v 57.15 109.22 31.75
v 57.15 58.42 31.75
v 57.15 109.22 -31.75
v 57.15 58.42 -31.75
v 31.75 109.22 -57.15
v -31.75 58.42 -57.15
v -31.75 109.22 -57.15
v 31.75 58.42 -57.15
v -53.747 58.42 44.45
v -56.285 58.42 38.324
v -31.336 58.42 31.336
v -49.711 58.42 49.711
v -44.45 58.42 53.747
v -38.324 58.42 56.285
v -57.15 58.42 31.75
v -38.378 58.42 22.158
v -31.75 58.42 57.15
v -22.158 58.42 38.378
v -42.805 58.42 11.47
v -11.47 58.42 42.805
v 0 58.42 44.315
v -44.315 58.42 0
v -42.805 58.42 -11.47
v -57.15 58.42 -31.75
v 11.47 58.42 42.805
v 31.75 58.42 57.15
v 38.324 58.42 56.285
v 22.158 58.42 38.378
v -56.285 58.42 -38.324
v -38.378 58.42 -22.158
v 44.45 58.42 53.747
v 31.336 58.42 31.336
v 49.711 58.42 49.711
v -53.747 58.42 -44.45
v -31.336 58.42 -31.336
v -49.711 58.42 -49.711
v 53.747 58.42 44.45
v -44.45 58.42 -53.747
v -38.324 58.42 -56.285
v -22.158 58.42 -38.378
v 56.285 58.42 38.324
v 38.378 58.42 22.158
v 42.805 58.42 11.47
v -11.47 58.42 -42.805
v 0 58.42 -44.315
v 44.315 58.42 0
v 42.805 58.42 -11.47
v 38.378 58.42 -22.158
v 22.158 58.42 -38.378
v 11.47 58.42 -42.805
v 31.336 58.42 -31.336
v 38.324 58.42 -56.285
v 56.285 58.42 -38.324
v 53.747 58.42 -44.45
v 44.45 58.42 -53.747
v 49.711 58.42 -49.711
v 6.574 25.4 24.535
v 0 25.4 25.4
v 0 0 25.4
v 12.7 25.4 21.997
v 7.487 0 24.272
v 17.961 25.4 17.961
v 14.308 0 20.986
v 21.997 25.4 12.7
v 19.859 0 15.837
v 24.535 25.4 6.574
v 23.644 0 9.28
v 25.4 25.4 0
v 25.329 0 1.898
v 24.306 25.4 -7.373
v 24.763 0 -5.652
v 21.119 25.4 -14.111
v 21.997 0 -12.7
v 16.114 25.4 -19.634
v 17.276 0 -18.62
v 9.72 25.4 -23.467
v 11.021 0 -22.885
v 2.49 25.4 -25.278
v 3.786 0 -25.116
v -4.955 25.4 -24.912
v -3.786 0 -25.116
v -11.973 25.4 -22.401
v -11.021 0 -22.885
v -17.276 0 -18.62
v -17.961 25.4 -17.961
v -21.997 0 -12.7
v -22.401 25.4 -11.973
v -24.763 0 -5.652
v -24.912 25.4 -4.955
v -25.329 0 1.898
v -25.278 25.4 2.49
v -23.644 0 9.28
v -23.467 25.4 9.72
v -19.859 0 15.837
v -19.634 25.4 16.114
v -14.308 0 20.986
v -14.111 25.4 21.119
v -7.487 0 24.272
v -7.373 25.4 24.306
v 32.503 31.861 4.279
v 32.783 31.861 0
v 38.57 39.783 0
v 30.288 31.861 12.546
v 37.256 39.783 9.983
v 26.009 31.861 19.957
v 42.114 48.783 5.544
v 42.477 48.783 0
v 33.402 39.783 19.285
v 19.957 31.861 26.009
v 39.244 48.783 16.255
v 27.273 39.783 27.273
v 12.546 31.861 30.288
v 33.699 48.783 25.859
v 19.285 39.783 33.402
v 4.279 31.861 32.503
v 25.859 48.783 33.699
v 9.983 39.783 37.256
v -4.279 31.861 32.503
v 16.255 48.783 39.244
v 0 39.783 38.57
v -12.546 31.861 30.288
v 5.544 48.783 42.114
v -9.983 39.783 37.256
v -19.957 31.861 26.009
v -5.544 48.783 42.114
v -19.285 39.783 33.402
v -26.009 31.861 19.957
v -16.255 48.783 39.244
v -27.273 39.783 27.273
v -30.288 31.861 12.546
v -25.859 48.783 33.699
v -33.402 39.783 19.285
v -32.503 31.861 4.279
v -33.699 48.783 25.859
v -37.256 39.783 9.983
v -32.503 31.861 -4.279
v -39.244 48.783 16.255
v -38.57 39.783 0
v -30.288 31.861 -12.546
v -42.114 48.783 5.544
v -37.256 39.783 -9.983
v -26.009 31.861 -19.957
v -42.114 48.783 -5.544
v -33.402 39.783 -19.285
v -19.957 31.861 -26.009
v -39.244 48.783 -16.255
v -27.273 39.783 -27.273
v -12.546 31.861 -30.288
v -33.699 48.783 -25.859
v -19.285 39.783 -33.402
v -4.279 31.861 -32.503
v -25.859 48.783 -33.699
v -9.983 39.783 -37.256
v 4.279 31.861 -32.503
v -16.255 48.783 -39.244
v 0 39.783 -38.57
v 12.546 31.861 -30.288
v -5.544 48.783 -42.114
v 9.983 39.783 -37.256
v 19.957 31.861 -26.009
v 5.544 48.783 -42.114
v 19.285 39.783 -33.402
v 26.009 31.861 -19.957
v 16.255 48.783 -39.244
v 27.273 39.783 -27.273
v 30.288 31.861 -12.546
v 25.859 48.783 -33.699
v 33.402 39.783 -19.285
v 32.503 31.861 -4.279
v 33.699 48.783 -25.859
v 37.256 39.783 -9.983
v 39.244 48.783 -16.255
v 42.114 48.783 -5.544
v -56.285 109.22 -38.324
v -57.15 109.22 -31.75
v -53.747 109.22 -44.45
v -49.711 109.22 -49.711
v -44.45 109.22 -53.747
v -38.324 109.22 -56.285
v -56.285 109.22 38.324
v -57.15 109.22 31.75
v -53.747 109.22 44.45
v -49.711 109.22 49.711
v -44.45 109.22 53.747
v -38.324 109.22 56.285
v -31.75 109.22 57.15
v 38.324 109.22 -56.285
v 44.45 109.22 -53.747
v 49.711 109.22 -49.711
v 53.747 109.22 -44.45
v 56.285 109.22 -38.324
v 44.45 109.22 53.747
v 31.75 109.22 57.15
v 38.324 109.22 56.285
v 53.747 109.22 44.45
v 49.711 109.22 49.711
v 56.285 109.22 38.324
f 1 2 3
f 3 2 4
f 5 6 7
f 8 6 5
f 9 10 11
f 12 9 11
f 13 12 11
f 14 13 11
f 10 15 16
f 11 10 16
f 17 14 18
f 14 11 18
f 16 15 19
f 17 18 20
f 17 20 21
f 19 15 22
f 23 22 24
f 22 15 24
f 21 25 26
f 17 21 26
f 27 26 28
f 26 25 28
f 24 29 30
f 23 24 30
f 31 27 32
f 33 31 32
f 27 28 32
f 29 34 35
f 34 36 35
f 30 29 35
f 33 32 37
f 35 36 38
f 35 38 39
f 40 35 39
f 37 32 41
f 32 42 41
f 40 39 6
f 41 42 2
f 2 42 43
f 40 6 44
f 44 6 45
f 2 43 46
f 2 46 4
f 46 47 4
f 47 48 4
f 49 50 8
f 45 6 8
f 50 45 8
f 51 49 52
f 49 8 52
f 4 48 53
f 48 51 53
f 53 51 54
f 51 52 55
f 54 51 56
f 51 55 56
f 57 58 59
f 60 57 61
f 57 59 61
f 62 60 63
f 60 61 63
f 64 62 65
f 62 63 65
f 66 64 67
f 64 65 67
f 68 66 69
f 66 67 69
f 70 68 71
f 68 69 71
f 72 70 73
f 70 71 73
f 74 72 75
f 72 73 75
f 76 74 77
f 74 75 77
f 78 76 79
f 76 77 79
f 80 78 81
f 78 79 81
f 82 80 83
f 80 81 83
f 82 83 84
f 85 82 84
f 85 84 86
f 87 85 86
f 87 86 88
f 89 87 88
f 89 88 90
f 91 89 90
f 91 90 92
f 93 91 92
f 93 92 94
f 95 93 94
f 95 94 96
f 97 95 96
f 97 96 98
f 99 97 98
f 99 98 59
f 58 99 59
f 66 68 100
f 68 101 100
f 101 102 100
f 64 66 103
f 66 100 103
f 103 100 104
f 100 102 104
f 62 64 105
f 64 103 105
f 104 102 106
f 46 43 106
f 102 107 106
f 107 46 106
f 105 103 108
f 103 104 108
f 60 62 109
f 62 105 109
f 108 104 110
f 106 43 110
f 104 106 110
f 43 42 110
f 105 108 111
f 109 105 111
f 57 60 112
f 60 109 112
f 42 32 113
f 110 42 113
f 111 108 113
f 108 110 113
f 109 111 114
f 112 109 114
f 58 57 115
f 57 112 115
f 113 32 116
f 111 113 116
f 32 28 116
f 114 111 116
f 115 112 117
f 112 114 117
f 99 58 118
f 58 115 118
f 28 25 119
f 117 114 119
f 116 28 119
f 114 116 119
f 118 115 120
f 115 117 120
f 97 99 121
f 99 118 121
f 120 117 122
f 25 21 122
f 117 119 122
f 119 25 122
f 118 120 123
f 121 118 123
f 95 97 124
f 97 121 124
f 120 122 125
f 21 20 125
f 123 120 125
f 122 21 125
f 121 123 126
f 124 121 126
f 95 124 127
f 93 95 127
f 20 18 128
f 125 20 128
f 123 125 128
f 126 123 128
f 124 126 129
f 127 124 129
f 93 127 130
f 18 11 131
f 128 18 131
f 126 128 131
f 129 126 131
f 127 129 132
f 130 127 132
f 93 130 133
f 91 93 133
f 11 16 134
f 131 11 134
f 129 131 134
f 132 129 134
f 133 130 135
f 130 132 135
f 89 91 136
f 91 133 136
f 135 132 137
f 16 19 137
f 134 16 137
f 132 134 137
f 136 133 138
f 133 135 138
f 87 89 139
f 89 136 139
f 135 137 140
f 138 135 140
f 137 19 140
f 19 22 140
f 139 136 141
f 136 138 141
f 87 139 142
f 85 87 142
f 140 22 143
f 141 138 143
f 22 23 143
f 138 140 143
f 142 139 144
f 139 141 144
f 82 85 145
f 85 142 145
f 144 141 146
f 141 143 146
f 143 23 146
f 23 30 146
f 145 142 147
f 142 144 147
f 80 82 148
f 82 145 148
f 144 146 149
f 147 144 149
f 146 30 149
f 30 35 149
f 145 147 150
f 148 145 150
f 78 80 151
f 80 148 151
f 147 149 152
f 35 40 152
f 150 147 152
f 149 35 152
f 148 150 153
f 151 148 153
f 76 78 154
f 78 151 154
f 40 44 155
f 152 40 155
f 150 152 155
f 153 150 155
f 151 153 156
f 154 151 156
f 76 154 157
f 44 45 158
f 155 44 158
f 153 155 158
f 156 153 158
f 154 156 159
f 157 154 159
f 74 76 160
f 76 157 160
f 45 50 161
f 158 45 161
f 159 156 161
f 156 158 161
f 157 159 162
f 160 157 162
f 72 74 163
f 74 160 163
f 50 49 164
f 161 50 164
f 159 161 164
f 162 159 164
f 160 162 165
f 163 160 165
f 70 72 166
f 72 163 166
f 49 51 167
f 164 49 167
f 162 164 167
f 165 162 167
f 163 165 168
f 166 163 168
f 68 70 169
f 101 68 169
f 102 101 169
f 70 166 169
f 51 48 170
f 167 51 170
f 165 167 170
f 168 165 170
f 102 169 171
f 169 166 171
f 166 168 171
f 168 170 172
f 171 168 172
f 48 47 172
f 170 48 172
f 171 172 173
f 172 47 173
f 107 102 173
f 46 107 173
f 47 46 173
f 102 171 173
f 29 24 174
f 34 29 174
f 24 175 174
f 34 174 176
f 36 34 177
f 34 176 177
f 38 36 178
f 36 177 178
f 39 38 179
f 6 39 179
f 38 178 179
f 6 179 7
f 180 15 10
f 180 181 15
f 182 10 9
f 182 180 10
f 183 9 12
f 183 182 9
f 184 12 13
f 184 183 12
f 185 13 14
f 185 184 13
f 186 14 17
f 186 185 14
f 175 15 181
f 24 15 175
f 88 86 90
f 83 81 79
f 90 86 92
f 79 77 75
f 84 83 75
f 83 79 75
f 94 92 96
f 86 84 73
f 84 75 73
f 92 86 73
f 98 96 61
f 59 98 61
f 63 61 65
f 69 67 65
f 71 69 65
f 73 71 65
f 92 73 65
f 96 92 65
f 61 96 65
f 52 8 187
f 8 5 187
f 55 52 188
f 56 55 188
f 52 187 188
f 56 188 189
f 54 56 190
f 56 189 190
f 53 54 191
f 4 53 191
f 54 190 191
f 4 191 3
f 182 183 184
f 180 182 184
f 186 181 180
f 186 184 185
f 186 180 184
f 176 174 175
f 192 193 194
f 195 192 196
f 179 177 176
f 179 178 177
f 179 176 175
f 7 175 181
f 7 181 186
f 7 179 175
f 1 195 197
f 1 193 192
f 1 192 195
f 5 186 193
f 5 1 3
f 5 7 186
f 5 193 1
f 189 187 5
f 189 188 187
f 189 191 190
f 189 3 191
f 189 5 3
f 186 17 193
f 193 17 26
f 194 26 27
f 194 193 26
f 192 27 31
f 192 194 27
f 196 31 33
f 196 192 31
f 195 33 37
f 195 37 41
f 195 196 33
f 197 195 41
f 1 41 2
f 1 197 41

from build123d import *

# Parameters (mm, degrees)
SKETCH1_R           = 25.4
BOSS_EXTRUDE1_DEPTH = 25.4
SKETCH3_W           = 114.3
SKETCH3_H           = 114.3
BOSS_EXTRUDE2_DEPTH = 50.8
FILLET1_R           = 25.4


with BuildPart() as part:
    # Sketch1 → Boss-Extrude1 (new body)
    with BuildSketch(Plane(origin=(0, 0, 0), x_dir=(1, 0, 0), z_dir=(0, 1, 0))):
        with Locations(Location((0, 0, 0), (0, 0, 270))):
            Circle(SKETCH1_R)
    extrude(amount=BOSS_EXTRUDE1_DEPTH)

    # Sketch2 one side → Revolve1 (revolve)
    with BuildSketch(Plane.XY):
        with BuildLine():
            Line((25.4, 25.4), (0, 25.4))
            Line((0, 25.4), (0, 17.427972806))
            ThreePointArc((0, 17.427972806), (13.310834098, 19.467783044), (25.4, 25.4))
        make_face()
        with BuildLine():
            ThreePointArc((44.45, 61.877972806), (31.430896424, 93.308869229), (0, 106.327972806))
            Line((0, 106.327972806), (0, 25.4))
            Line((0, 25.4), (25.4, 25.4))
            ThreePointArc((25.4, 25.4), (39.400713826, 41.301621088), (44.45, 61.877972806))
        make_face()
    revolve(axis=Axis((0, 145.460296173, 0), (0, -1, 0)))

    # Sketch3 → Boss-Extrude2 (add)
    with BuildSketch(Plane(origin=(0, 58.42, 0), x_dir=(1, 0, 0), z_dir=(0, 1, 0))):
        Rectangle(SKETCH3_W, SKETCH3_H)
    extrude(amount=BOSS_EXTRUDE2_DEPTH)

    # Fillet1
    fillet1_edges = [part.edges().sort_by_distance(p)[0] for p in [
        (-57.15, 83.82, 57.15),
        (57.15, 83.82, 57.15),
        (57.15, 83.82, -57.15),
        (-57.15, 83.82, -57.15),
    ]]
    fillet(fillet1_edges, radius=FILLET1_R)


solid = part.part
